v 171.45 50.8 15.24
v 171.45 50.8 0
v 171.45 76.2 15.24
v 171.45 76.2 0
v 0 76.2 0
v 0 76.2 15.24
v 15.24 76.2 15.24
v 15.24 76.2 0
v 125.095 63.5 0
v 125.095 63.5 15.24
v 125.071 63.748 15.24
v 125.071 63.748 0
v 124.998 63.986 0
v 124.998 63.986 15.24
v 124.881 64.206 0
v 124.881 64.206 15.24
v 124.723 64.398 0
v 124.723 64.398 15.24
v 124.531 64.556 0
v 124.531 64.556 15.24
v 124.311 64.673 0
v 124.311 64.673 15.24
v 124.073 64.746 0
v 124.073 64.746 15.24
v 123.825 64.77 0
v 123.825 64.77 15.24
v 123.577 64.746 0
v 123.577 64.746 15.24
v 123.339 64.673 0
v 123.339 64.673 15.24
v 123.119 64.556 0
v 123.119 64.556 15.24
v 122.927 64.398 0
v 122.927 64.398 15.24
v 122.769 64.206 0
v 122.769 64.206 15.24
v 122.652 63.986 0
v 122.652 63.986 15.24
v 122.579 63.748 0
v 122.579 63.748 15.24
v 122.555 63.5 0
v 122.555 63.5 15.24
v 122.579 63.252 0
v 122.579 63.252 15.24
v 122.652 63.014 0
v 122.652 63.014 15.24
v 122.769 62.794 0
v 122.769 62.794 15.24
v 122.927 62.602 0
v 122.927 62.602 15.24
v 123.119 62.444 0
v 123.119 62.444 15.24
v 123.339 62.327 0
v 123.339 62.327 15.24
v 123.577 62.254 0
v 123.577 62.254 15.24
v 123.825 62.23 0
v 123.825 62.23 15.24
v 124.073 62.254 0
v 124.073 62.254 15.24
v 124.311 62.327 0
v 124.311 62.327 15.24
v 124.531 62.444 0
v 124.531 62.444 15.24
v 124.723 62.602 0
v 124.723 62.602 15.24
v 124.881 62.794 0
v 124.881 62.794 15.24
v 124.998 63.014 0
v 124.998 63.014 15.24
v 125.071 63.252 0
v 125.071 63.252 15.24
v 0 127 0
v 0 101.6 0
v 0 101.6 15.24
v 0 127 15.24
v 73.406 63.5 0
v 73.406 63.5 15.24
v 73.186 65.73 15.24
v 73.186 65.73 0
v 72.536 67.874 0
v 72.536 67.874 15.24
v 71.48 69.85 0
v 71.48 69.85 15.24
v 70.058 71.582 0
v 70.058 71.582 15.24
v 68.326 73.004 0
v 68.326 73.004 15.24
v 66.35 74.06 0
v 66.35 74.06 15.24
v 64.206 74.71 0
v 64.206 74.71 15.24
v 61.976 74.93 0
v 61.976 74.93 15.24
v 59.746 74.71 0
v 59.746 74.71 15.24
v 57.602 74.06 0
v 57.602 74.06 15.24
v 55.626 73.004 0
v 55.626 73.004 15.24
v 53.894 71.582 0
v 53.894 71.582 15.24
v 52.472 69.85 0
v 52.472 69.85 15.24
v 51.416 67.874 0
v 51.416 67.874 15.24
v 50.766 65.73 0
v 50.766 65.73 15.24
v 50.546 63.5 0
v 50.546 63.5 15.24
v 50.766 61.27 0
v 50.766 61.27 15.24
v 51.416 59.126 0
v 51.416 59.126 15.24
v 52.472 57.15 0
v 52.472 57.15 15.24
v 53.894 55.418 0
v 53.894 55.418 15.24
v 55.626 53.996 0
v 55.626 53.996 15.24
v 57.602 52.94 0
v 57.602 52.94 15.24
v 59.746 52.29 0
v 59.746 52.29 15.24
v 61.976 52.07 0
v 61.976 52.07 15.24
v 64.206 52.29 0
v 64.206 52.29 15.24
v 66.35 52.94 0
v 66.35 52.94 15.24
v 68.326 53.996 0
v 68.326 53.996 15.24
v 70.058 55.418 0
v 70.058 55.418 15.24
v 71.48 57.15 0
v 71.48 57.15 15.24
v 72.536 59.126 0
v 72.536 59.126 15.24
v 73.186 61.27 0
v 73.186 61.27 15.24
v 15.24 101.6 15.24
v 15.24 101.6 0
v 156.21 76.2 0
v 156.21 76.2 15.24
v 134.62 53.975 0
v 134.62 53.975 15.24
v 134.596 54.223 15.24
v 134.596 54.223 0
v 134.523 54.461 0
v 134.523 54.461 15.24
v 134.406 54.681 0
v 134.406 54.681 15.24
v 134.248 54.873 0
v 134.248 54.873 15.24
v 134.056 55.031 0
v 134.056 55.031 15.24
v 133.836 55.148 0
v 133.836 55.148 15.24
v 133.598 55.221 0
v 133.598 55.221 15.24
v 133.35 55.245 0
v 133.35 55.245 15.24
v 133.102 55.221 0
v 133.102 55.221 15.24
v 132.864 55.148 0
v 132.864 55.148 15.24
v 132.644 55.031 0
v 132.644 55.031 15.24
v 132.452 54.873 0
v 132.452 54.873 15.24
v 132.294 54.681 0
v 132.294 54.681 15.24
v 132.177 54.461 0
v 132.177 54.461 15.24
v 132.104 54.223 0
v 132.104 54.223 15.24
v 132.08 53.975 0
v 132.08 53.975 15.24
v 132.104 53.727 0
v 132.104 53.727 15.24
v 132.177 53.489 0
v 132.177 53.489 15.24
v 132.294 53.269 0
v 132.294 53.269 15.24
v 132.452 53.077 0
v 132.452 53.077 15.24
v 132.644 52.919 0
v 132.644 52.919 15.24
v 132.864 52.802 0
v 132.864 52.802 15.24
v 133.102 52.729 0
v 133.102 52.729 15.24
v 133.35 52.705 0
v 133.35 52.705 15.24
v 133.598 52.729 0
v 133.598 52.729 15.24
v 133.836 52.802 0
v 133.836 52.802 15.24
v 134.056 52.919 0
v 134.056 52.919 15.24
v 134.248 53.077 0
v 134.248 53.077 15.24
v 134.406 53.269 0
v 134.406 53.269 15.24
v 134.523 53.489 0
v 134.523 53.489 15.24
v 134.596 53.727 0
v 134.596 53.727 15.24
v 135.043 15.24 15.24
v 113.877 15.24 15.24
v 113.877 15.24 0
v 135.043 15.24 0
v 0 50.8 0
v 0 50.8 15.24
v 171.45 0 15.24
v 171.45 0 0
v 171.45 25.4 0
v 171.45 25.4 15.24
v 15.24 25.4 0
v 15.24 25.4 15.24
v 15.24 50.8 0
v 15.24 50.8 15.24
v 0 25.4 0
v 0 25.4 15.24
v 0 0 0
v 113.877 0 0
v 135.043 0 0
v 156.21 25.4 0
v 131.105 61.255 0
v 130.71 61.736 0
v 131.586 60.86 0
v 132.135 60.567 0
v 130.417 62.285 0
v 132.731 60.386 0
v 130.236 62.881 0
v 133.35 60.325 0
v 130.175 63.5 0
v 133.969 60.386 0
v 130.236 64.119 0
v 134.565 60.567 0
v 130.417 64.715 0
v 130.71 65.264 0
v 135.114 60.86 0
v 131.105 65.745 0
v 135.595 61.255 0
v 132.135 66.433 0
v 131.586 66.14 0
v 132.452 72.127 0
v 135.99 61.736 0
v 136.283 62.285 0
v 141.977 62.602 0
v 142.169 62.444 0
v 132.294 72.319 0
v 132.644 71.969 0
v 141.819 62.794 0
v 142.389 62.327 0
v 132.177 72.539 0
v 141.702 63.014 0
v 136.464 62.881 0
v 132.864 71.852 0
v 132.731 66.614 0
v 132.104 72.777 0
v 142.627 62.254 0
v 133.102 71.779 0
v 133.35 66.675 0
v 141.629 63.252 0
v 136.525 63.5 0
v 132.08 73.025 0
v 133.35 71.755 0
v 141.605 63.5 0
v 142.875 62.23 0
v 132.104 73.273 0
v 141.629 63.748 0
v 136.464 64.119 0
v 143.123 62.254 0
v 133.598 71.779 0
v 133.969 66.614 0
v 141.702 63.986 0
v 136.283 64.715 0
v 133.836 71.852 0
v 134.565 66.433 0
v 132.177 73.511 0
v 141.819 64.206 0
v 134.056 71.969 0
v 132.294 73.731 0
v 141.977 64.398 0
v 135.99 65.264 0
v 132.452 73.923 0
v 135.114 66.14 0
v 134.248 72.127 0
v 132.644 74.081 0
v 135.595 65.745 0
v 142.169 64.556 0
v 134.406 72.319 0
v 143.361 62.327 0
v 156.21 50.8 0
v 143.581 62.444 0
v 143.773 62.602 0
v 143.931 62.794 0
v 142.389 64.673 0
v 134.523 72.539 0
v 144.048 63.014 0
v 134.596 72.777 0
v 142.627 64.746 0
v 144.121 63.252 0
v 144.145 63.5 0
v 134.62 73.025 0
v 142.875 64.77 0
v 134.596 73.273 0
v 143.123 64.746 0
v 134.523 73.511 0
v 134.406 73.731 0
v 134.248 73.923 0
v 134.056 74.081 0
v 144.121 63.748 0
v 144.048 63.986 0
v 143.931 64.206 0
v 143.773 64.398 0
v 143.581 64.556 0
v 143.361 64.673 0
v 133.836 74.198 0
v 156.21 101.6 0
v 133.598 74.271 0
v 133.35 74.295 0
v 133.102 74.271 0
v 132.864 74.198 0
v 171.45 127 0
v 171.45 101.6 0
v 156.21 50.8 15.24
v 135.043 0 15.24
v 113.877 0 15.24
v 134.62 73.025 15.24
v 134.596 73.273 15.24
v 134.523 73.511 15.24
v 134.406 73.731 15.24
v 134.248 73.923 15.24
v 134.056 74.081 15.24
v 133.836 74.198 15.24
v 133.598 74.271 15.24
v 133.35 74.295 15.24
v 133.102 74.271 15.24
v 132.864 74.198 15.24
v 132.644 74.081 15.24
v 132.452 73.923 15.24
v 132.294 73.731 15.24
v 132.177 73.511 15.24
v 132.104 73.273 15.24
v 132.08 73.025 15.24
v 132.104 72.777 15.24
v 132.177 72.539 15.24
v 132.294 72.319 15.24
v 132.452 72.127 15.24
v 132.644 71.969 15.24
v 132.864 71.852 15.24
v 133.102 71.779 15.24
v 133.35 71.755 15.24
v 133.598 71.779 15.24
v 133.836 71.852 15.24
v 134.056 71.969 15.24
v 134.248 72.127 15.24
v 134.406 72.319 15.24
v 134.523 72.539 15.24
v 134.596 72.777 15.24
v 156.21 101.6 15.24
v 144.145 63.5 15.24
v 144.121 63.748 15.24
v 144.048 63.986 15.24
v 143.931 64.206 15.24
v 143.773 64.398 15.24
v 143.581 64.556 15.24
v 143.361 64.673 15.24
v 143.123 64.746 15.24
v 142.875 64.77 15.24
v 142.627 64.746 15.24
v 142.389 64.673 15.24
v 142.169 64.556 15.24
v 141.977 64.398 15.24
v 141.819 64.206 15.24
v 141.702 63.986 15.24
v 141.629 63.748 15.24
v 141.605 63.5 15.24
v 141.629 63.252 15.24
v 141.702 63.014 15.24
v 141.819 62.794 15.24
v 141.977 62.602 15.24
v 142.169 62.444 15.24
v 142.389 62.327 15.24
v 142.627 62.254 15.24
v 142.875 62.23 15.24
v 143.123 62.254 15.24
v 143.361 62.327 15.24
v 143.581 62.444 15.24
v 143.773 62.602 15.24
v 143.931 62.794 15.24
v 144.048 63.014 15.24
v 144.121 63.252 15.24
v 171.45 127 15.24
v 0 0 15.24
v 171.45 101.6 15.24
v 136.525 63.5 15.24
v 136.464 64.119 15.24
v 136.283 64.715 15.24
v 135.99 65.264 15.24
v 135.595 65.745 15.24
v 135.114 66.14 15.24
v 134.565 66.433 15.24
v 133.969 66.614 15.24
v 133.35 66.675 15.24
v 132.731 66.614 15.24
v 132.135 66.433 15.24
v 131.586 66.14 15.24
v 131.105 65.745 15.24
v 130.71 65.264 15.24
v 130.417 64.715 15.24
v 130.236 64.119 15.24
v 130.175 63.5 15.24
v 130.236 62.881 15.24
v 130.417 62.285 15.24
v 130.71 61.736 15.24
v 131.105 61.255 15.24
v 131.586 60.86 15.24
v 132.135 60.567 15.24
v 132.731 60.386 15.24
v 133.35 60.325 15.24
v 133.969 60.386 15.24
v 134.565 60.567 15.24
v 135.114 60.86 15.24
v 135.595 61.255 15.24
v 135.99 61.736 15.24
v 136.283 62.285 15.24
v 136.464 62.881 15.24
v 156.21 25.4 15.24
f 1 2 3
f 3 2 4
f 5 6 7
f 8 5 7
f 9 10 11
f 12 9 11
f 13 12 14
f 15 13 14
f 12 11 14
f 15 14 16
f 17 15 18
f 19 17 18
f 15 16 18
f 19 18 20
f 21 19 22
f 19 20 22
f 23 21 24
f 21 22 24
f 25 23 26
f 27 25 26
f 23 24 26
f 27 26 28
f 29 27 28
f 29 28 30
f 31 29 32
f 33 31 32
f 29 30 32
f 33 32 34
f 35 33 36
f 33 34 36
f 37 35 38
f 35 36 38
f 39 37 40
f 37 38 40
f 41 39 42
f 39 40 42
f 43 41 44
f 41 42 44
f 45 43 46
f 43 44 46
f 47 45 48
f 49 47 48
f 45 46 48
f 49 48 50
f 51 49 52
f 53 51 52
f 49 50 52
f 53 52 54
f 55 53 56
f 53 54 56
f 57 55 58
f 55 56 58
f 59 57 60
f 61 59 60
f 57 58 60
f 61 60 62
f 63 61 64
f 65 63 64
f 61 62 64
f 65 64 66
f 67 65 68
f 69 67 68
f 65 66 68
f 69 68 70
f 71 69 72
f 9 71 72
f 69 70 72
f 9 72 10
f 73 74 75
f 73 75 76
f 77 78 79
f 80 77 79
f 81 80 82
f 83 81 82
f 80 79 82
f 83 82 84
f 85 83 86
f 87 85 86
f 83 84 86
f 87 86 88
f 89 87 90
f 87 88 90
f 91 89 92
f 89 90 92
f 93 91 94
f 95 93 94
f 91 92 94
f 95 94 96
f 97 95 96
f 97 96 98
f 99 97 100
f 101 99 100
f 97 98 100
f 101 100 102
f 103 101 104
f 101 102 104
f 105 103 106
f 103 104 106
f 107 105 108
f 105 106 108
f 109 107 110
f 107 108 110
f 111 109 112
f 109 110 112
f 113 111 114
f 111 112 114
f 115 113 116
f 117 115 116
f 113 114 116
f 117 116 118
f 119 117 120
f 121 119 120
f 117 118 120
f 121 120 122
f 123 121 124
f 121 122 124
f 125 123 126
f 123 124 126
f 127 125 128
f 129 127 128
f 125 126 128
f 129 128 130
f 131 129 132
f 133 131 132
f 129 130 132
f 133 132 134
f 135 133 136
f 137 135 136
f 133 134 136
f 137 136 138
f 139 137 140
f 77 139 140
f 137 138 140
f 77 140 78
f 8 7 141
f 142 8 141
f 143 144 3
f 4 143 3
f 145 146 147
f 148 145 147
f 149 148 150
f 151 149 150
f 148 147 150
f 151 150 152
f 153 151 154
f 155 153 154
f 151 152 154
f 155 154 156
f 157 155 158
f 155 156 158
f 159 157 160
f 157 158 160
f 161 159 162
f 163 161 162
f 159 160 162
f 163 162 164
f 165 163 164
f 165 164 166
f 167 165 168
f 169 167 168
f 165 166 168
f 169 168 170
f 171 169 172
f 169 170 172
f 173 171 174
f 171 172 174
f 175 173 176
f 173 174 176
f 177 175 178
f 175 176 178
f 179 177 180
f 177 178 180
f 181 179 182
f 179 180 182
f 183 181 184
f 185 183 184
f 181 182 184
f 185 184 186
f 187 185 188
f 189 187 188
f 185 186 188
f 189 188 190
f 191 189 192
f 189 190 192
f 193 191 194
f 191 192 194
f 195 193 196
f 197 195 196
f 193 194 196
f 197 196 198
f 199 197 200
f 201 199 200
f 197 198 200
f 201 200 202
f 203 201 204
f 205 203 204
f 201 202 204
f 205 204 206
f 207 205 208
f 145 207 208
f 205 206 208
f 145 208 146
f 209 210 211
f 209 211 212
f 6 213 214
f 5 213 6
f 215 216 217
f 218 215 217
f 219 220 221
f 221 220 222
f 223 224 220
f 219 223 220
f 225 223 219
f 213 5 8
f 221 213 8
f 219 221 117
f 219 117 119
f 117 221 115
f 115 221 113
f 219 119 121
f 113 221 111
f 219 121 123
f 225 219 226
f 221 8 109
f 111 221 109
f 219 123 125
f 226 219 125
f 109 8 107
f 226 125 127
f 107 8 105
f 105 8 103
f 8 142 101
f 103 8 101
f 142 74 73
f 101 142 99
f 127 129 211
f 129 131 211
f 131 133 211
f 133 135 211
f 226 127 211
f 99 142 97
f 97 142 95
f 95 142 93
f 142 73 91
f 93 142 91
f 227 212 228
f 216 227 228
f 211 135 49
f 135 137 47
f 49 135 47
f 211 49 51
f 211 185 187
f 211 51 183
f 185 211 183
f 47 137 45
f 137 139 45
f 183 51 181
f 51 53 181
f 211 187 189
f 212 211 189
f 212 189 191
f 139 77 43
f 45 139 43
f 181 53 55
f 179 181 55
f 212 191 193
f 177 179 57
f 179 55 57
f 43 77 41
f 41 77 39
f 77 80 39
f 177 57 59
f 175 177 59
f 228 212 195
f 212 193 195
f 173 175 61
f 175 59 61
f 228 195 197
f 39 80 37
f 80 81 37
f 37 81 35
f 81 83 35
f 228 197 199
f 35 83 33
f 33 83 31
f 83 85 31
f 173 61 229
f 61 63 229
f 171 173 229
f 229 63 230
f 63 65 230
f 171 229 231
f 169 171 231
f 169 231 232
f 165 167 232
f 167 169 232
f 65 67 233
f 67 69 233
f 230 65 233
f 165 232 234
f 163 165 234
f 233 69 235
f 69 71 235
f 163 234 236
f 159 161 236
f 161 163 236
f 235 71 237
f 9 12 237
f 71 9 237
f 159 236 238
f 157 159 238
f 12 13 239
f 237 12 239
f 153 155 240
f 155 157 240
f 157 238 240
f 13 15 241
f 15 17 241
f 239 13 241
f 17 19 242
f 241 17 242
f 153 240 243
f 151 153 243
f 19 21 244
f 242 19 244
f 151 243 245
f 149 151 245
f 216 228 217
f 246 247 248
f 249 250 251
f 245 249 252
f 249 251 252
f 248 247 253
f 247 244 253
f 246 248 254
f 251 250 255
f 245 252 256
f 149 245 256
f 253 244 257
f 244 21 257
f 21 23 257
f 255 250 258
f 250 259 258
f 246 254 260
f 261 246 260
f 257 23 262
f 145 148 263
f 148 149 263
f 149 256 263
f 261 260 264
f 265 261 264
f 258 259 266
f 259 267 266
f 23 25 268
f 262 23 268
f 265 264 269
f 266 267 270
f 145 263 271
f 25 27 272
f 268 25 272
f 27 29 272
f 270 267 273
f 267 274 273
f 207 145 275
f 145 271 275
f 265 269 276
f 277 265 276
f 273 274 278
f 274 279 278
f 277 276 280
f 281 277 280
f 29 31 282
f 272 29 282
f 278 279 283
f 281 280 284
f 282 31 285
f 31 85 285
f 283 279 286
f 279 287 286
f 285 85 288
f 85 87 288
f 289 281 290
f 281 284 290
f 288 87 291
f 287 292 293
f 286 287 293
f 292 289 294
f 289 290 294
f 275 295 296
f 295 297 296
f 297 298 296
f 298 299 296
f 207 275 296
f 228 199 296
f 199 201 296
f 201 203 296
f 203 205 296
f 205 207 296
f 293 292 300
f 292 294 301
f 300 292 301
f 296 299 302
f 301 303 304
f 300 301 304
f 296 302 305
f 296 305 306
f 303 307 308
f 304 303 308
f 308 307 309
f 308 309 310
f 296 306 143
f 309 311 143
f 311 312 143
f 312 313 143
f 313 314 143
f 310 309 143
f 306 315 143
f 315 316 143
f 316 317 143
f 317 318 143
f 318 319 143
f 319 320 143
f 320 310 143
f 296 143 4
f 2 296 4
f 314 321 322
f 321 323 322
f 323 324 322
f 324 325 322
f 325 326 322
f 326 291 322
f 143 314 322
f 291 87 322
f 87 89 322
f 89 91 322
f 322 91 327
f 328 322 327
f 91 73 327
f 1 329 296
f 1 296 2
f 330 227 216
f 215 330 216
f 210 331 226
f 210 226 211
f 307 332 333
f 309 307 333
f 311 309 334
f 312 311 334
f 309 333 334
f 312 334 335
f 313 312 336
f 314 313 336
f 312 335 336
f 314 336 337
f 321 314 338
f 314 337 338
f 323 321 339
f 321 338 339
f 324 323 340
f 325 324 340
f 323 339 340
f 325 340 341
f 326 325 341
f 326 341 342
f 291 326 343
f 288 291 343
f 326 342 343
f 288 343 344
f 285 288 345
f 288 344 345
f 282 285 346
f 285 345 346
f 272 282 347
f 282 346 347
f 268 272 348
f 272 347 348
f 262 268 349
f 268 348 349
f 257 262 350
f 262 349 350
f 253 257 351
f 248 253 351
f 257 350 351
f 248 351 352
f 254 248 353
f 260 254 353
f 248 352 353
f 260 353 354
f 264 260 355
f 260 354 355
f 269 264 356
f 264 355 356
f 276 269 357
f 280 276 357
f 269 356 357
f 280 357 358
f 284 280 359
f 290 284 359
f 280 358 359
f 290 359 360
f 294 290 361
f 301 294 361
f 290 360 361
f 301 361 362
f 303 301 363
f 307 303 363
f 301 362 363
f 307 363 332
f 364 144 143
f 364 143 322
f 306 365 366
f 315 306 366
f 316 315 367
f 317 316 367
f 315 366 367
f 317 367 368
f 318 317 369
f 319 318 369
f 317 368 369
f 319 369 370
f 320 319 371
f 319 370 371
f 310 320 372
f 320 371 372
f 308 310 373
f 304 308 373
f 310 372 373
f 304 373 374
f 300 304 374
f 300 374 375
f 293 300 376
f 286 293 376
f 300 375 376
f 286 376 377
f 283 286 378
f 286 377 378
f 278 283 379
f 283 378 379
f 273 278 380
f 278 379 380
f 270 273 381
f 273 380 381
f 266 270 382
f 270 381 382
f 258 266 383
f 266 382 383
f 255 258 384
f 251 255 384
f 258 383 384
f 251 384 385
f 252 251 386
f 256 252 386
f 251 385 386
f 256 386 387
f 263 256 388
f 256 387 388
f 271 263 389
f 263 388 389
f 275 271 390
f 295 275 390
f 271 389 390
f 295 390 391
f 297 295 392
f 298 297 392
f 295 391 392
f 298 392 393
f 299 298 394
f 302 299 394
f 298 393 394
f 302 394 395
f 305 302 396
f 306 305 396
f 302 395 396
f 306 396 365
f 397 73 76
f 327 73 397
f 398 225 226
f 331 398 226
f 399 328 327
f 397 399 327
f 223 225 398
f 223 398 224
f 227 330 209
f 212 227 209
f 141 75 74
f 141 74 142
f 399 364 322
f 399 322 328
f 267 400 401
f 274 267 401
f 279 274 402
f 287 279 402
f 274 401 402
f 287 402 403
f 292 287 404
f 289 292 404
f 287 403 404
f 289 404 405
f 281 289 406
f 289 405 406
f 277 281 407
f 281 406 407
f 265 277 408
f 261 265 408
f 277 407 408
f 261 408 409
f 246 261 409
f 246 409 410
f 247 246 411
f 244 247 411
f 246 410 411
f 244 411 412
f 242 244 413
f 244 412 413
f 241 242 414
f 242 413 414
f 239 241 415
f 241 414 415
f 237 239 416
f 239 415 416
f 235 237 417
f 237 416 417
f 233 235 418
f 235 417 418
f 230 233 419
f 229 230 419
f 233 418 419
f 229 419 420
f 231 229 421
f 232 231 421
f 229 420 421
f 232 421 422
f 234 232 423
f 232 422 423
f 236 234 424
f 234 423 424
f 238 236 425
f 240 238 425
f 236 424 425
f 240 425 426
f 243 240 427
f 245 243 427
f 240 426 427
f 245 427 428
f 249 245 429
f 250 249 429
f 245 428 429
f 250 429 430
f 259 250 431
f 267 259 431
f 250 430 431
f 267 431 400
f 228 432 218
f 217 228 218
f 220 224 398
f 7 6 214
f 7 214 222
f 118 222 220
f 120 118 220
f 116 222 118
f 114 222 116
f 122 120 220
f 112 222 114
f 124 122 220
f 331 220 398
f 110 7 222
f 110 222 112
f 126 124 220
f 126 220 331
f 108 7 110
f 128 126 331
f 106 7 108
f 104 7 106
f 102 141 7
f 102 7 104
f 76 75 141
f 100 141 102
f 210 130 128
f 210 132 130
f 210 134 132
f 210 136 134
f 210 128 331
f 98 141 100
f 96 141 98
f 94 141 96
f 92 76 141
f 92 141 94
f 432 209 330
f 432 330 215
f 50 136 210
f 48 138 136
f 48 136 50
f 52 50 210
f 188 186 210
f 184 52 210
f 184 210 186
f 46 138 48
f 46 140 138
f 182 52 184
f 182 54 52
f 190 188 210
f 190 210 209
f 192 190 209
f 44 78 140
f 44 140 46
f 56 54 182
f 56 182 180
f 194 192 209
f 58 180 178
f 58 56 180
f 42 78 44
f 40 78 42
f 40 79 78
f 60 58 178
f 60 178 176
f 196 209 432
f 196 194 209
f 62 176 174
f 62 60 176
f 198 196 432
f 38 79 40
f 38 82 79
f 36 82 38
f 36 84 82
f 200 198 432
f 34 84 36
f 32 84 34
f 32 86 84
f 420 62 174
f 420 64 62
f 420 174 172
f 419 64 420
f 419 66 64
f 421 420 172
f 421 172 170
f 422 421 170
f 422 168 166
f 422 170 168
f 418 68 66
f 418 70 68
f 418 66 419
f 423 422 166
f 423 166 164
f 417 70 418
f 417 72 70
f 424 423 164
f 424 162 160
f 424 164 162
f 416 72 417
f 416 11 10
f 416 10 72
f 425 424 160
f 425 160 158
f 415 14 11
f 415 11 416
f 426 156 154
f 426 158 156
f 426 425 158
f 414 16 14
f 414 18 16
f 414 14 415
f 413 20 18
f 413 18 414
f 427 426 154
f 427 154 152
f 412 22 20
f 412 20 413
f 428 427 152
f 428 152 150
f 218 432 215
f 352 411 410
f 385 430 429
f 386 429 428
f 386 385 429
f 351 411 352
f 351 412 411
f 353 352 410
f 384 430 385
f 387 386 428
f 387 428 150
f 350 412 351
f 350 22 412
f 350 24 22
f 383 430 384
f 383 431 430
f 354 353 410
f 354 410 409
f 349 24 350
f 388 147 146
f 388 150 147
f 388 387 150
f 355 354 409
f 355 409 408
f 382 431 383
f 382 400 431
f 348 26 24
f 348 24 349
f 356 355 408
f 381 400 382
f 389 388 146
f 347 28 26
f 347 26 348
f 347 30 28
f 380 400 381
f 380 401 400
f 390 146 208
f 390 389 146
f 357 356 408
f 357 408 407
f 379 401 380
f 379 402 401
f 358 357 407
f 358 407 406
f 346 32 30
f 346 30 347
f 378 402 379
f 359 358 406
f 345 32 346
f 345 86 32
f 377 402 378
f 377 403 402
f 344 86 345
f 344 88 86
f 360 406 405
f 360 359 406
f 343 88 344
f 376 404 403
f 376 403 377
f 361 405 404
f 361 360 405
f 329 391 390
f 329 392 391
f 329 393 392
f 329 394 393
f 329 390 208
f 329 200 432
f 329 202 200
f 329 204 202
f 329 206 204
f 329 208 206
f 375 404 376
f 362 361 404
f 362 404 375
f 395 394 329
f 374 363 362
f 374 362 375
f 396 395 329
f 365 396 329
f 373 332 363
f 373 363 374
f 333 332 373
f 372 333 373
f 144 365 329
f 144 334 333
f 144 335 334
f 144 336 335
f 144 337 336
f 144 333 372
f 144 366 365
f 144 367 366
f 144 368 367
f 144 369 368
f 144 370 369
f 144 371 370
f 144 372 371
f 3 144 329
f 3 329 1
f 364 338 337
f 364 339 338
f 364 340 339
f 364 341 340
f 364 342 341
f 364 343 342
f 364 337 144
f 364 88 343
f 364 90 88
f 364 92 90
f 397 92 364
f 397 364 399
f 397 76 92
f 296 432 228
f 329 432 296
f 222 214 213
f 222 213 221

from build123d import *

# Parameters (mm, degrees)
SKETCH1_W           = 171.45
SKETCH1_H           = 127
BOSS_EXTRUDE1_DEPTH = 15.24
SKETCH5_W           = 15.24
SKETCH5_H           = 25.4
CUT_EXTRUDE1_DEPTH  = 15.24
SKETCH11_R          = 11.43
CUT_EXTRUDE3_DEPTH  = 15.24
SKETCH12_R          = 3.175
SKETCH12_R_2        = 1.27
CUT_EXTRUDE4_DEPTH  = 15.24
SKETCH7_W           = 21.166666666
SKETCH7_H           = 15.24
CUT_EXTRUDE5_DEPTH  = 15.24


with BuildPart() as part:
    # Sketch1 → Boss-Extrude1 (new body)
    with BuildSketch(Plane.XY):
        with Locations((85.725, 63.5)):
            Rectangle(SKETCH1_W, SKETCH1_H)
    extrude(amount=BOSS_EXTRUDE1_DEPTH)

    # Sketch5 → Cut-Extrude1 (cut)
    with BuildSketch(Plane.XY.offset(15.24)):
        with Locations((7.62, 88.9)):
            Rectangle(SKETCH5_W, SKETCH5_H)
        with Locations((7.62, 38.1)):
            Rectangle(SKETCH5_W, SKETCH5_H)
        with Locations((163.83, 88.9)):
            Rectangle(SKETCH5_W, SKETCH5_H)
        with Locations((163.83, 38.1)):
            Rectangle(SKETCH5_W, SKETCH5_H)
    extrude(amount=-CUT_EXTRUDE1_DEPTH, mode=Mode.SUBTRACT)

    # Sketch11 → Cut-Extrude3 (cut)
    with BuildSketch(Plane.XY.offset(15.24)):
        with Locations((61.976, 63.5)):
            Circle(SKETCH11_R)
    extrude(amount=-CUT_EXTRUDE3_DEPTH, mode=Mode.SUBTRACT)

    # Sketch12 → Cut-Extrude4 (cut)
    with BuildSketch(Plane.XY.offset(15.24)):
        with Locations((133.35, 63.5)):
            Circle(SKETCH12_R)
        with Locations((133.35, 73.025)):
            Circle(SKETCH12_R_2)
        with Locations((142.875, 63.5)):
            Circle(SKETCH12_R_2)
        with Locations((133.35, 53.975)):
            Circle(SKETCH12_R_2)
        with Locations((123.825, 63.5)):
            Circle(SKETCH12_R_2)
    extrude(amount=-CUT_EXTRUDE4_DEPTH, mode=Mode.SUBTRACT)

    # Sketch7 → Cut-Extrude5 (cut)
    with BuildSketch(Plane.XY.offset(15.24)):
        with Locations((124.46, 7.62)):
            Rectangle(SKETCH7_W, SKETCH7_H)
    extrude(amount=-CUT_EXTRUDE5_DEPTH, mode=Mode.SUBTRACT)


solid = part.part
